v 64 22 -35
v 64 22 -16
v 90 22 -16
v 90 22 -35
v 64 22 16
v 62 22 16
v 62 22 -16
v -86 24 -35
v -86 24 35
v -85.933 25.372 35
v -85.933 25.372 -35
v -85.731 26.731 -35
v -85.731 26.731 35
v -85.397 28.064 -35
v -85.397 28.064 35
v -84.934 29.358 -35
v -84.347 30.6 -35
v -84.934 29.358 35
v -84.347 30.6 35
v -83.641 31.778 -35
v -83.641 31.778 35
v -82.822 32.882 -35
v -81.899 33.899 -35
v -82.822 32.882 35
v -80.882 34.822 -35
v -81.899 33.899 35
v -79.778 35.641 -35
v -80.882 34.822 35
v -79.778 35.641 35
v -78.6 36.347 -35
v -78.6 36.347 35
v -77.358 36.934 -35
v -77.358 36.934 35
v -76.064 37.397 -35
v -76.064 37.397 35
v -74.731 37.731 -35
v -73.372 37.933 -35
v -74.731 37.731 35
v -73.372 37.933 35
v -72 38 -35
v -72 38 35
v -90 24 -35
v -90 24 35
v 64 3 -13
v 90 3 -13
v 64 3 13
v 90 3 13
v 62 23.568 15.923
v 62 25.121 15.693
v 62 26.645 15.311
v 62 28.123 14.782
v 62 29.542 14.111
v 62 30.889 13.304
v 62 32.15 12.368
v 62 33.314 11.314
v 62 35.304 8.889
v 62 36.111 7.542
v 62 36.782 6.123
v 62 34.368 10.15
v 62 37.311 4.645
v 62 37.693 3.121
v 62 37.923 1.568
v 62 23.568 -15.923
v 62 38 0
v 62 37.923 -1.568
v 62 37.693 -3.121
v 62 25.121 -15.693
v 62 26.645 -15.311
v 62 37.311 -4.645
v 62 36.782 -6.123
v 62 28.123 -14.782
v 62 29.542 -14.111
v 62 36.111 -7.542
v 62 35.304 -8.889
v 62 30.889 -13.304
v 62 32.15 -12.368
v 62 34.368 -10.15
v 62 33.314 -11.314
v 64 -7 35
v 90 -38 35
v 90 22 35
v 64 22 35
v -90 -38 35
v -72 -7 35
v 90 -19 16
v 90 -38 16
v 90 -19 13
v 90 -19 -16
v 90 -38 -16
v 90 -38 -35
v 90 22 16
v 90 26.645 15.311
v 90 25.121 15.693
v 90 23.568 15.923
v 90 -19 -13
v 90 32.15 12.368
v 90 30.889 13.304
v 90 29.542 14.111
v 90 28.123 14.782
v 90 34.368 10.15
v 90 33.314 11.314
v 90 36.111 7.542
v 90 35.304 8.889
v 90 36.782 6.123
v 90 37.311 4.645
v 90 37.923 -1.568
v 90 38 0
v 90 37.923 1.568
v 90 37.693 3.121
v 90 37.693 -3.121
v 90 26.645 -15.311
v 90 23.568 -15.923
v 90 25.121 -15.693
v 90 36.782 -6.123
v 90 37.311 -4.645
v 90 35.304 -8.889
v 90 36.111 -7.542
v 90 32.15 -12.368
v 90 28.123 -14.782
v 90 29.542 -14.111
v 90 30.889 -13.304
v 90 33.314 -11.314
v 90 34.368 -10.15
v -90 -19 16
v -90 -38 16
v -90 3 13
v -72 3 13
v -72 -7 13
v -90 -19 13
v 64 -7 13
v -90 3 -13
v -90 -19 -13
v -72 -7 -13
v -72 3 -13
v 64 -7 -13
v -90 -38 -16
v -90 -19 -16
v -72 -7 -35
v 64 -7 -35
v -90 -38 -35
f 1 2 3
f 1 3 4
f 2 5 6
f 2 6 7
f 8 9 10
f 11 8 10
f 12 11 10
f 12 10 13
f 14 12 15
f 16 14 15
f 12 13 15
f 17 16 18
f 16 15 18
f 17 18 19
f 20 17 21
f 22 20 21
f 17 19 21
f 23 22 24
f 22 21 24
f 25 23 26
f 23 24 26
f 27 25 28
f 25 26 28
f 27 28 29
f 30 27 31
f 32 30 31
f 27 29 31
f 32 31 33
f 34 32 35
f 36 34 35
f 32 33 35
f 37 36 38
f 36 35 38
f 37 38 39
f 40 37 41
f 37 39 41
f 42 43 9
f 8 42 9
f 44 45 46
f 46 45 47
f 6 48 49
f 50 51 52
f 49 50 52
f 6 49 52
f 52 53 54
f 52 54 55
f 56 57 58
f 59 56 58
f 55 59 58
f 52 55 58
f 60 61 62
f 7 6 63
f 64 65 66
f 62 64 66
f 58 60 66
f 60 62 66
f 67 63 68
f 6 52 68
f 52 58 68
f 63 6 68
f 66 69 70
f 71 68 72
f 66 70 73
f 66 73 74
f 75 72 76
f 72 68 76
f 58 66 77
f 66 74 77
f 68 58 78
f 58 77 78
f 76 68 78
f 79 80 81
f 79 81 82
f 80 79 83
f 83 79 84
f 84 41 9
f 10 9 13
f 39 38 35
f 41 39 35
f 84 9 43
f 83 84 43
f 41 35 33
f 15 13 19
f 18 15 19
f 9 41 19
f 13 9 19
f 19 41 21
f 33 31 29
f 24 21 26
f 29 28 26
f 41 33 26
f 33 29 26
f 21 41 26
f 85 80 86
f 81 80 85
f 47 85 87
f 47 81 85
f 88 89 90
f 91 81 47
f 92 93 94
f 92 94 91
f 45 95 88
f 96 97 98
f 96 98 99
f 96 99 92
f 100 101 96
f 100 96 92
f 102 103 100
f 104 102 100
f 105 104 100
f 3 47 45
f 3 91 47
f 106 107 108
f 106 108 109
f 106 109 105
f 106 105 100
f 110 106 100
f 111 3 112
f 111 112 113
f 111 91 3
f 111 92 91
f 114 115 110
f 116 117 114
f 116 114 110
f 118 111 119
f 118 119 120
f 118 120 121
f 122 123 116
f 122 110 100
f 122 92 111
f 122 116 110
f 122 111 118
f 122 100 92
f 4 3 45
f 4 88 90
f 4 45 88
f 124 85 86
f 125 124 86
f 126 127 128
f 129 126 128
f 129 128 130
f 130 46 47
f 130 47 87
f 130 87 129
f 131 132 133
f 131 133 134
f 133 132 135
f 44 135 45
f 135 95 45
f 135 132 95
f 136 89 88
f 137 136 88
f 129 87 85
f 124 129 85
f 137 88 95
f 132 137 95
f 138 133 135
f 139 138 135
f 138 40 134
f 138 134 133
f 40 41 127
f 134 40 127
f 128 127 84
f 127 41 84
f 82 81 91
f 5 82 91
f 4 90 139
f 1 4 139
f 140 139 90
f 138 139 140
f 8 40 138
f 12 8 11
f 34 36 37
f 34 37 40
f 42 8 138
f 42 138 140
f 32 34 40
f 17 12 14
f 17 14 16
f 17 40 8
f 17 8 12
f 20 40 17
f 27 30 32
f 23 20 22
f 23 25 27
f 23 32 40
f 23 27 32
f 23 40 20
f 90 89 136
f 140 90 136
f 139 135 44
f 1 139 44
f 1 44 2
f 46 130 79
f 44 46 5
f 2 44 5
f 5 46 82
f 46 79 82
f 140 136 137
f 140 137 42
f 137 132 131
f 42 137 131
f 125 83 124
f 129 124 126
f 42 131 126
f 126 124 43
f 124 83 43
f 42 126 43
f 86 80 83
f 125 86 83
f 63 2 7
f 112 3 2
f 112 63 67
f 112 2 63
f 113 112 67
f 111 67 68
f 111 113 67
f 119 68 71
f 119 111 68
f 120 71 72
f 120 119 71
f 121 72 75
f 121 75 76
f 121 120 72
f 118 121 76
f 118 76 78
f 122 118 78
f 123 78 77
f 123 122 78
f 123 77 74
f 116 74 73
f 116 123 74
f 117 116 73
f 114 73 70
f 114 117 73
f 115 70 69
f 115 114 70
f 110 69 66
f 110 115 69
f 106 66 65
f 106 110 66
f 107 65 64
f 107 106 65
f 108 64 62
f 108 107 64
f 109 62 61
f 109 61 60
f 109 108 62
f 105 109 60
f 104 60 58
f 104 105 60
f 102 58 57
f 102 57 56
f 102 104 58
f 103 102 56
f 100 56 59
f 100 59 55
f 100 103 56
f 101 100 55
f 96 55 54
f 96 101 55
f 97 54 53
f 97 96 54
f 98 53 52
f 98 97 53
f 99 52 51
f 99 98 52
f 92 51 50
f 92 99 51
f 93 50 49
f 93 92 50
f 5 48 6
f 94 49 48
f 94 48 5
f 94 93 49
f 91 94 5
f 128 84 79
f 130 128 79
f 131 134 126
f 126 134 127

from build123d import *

# Parameters (mm, degrees)
BOSS_EXTRUDE1_DEPTH     = 35
CUT_EXTRUDE1_DEPTH      = 1
CUT_EXTRUDE1_DEPTH_BACK = 181
CUT_EXTRUDE2_DEPTH      = 70
SKETCH9_W               = 70
SKETCH9_H               = 16
CUT_EXTRUDE4_DEPTH      = 70
BOSS_EXTRUDE2_DEPTH     = 28


with BuildPart() as part:
    # Sketch2 → Boss-Extrude1 (new body, symmetric)
    with BuildSketch(Plane.XY):
        Polygon((-72, 38), (-72, -7), (64, -7), (64, 38), (90, 38), (90, -38), (-90, -38), (-90, 38), align=None)
    extrude(amount=BOSS_EXTRUDE1_DEPTH, both=True)

    # Sketch3 → Cut-Extrude1 (cut, two sides)
    with BuildSketch(Plane(origin=(90, 0, 0), x_dir=(0, 0, -1), z_dir=(1, 0, 0))) as cut_extrude1_sk:
        Polygon((16, -38), (16, -19), (13, -19), (13, 3), (-13, 3), (-13, -19), (-16, -19), (-16, -38), align=None)
    extrude(amount=CUT_EXTRUDE1_DEPTH, mode=Mode.SUBTRACT)
    extrude(cut_extrude1_sk.sketch, amount=-CUT_EXTRUDE1_DEPTH_BACK, mode=Mode.SUBTRACT)

    # Sketch5 → Cut-Extrude2 (cut)
    with BuildSketch(Plane.XY.offset(35)):
        with BuildLine():
            Line((-90, 24), (-86, 24))
            ThreePointArc((-86, 24), (-81.899494937, 33.899494937), (-72, 38))
            Line((-72, 38), (-90, 38))
            Line((-90, 38), (-90, 24))
        make_face()
    extrude(amount=-CUT_EXTRUDE2_DEPTH, mode=Mode.SUBTRACT)

    # Sketch9 → Cut-Extrude4 (cut)
    with BuildSketch(Plane(origin=(90, 0, 0), x_dir=(0, 0, -1), z_dir=(1, 0, 0))):
        with Locations((0, 30)):
            Rectangle(SKETCH9_W, SKETCH9_H)
    extrude(amount=-CUT_EXTRUDE4_DEPTH, mode=Mode.SUBTRACT)

    # Sketch10 → Boss-Extrude2 (add)
    with BuildSketch(Plane(origin=(90, 0, 0), x_dir=(0, 0, -1), z_dir=(1, 0, 0))):
        with BuildLine():
            Line((-16, 22), (16, 22))
            ThreePointArc((16, 22), (0, 38), (-16, 22))
        make_face()
    extrude(amount=-BOSS_EXTRUDE2_DEPTH)


solid = part.part
